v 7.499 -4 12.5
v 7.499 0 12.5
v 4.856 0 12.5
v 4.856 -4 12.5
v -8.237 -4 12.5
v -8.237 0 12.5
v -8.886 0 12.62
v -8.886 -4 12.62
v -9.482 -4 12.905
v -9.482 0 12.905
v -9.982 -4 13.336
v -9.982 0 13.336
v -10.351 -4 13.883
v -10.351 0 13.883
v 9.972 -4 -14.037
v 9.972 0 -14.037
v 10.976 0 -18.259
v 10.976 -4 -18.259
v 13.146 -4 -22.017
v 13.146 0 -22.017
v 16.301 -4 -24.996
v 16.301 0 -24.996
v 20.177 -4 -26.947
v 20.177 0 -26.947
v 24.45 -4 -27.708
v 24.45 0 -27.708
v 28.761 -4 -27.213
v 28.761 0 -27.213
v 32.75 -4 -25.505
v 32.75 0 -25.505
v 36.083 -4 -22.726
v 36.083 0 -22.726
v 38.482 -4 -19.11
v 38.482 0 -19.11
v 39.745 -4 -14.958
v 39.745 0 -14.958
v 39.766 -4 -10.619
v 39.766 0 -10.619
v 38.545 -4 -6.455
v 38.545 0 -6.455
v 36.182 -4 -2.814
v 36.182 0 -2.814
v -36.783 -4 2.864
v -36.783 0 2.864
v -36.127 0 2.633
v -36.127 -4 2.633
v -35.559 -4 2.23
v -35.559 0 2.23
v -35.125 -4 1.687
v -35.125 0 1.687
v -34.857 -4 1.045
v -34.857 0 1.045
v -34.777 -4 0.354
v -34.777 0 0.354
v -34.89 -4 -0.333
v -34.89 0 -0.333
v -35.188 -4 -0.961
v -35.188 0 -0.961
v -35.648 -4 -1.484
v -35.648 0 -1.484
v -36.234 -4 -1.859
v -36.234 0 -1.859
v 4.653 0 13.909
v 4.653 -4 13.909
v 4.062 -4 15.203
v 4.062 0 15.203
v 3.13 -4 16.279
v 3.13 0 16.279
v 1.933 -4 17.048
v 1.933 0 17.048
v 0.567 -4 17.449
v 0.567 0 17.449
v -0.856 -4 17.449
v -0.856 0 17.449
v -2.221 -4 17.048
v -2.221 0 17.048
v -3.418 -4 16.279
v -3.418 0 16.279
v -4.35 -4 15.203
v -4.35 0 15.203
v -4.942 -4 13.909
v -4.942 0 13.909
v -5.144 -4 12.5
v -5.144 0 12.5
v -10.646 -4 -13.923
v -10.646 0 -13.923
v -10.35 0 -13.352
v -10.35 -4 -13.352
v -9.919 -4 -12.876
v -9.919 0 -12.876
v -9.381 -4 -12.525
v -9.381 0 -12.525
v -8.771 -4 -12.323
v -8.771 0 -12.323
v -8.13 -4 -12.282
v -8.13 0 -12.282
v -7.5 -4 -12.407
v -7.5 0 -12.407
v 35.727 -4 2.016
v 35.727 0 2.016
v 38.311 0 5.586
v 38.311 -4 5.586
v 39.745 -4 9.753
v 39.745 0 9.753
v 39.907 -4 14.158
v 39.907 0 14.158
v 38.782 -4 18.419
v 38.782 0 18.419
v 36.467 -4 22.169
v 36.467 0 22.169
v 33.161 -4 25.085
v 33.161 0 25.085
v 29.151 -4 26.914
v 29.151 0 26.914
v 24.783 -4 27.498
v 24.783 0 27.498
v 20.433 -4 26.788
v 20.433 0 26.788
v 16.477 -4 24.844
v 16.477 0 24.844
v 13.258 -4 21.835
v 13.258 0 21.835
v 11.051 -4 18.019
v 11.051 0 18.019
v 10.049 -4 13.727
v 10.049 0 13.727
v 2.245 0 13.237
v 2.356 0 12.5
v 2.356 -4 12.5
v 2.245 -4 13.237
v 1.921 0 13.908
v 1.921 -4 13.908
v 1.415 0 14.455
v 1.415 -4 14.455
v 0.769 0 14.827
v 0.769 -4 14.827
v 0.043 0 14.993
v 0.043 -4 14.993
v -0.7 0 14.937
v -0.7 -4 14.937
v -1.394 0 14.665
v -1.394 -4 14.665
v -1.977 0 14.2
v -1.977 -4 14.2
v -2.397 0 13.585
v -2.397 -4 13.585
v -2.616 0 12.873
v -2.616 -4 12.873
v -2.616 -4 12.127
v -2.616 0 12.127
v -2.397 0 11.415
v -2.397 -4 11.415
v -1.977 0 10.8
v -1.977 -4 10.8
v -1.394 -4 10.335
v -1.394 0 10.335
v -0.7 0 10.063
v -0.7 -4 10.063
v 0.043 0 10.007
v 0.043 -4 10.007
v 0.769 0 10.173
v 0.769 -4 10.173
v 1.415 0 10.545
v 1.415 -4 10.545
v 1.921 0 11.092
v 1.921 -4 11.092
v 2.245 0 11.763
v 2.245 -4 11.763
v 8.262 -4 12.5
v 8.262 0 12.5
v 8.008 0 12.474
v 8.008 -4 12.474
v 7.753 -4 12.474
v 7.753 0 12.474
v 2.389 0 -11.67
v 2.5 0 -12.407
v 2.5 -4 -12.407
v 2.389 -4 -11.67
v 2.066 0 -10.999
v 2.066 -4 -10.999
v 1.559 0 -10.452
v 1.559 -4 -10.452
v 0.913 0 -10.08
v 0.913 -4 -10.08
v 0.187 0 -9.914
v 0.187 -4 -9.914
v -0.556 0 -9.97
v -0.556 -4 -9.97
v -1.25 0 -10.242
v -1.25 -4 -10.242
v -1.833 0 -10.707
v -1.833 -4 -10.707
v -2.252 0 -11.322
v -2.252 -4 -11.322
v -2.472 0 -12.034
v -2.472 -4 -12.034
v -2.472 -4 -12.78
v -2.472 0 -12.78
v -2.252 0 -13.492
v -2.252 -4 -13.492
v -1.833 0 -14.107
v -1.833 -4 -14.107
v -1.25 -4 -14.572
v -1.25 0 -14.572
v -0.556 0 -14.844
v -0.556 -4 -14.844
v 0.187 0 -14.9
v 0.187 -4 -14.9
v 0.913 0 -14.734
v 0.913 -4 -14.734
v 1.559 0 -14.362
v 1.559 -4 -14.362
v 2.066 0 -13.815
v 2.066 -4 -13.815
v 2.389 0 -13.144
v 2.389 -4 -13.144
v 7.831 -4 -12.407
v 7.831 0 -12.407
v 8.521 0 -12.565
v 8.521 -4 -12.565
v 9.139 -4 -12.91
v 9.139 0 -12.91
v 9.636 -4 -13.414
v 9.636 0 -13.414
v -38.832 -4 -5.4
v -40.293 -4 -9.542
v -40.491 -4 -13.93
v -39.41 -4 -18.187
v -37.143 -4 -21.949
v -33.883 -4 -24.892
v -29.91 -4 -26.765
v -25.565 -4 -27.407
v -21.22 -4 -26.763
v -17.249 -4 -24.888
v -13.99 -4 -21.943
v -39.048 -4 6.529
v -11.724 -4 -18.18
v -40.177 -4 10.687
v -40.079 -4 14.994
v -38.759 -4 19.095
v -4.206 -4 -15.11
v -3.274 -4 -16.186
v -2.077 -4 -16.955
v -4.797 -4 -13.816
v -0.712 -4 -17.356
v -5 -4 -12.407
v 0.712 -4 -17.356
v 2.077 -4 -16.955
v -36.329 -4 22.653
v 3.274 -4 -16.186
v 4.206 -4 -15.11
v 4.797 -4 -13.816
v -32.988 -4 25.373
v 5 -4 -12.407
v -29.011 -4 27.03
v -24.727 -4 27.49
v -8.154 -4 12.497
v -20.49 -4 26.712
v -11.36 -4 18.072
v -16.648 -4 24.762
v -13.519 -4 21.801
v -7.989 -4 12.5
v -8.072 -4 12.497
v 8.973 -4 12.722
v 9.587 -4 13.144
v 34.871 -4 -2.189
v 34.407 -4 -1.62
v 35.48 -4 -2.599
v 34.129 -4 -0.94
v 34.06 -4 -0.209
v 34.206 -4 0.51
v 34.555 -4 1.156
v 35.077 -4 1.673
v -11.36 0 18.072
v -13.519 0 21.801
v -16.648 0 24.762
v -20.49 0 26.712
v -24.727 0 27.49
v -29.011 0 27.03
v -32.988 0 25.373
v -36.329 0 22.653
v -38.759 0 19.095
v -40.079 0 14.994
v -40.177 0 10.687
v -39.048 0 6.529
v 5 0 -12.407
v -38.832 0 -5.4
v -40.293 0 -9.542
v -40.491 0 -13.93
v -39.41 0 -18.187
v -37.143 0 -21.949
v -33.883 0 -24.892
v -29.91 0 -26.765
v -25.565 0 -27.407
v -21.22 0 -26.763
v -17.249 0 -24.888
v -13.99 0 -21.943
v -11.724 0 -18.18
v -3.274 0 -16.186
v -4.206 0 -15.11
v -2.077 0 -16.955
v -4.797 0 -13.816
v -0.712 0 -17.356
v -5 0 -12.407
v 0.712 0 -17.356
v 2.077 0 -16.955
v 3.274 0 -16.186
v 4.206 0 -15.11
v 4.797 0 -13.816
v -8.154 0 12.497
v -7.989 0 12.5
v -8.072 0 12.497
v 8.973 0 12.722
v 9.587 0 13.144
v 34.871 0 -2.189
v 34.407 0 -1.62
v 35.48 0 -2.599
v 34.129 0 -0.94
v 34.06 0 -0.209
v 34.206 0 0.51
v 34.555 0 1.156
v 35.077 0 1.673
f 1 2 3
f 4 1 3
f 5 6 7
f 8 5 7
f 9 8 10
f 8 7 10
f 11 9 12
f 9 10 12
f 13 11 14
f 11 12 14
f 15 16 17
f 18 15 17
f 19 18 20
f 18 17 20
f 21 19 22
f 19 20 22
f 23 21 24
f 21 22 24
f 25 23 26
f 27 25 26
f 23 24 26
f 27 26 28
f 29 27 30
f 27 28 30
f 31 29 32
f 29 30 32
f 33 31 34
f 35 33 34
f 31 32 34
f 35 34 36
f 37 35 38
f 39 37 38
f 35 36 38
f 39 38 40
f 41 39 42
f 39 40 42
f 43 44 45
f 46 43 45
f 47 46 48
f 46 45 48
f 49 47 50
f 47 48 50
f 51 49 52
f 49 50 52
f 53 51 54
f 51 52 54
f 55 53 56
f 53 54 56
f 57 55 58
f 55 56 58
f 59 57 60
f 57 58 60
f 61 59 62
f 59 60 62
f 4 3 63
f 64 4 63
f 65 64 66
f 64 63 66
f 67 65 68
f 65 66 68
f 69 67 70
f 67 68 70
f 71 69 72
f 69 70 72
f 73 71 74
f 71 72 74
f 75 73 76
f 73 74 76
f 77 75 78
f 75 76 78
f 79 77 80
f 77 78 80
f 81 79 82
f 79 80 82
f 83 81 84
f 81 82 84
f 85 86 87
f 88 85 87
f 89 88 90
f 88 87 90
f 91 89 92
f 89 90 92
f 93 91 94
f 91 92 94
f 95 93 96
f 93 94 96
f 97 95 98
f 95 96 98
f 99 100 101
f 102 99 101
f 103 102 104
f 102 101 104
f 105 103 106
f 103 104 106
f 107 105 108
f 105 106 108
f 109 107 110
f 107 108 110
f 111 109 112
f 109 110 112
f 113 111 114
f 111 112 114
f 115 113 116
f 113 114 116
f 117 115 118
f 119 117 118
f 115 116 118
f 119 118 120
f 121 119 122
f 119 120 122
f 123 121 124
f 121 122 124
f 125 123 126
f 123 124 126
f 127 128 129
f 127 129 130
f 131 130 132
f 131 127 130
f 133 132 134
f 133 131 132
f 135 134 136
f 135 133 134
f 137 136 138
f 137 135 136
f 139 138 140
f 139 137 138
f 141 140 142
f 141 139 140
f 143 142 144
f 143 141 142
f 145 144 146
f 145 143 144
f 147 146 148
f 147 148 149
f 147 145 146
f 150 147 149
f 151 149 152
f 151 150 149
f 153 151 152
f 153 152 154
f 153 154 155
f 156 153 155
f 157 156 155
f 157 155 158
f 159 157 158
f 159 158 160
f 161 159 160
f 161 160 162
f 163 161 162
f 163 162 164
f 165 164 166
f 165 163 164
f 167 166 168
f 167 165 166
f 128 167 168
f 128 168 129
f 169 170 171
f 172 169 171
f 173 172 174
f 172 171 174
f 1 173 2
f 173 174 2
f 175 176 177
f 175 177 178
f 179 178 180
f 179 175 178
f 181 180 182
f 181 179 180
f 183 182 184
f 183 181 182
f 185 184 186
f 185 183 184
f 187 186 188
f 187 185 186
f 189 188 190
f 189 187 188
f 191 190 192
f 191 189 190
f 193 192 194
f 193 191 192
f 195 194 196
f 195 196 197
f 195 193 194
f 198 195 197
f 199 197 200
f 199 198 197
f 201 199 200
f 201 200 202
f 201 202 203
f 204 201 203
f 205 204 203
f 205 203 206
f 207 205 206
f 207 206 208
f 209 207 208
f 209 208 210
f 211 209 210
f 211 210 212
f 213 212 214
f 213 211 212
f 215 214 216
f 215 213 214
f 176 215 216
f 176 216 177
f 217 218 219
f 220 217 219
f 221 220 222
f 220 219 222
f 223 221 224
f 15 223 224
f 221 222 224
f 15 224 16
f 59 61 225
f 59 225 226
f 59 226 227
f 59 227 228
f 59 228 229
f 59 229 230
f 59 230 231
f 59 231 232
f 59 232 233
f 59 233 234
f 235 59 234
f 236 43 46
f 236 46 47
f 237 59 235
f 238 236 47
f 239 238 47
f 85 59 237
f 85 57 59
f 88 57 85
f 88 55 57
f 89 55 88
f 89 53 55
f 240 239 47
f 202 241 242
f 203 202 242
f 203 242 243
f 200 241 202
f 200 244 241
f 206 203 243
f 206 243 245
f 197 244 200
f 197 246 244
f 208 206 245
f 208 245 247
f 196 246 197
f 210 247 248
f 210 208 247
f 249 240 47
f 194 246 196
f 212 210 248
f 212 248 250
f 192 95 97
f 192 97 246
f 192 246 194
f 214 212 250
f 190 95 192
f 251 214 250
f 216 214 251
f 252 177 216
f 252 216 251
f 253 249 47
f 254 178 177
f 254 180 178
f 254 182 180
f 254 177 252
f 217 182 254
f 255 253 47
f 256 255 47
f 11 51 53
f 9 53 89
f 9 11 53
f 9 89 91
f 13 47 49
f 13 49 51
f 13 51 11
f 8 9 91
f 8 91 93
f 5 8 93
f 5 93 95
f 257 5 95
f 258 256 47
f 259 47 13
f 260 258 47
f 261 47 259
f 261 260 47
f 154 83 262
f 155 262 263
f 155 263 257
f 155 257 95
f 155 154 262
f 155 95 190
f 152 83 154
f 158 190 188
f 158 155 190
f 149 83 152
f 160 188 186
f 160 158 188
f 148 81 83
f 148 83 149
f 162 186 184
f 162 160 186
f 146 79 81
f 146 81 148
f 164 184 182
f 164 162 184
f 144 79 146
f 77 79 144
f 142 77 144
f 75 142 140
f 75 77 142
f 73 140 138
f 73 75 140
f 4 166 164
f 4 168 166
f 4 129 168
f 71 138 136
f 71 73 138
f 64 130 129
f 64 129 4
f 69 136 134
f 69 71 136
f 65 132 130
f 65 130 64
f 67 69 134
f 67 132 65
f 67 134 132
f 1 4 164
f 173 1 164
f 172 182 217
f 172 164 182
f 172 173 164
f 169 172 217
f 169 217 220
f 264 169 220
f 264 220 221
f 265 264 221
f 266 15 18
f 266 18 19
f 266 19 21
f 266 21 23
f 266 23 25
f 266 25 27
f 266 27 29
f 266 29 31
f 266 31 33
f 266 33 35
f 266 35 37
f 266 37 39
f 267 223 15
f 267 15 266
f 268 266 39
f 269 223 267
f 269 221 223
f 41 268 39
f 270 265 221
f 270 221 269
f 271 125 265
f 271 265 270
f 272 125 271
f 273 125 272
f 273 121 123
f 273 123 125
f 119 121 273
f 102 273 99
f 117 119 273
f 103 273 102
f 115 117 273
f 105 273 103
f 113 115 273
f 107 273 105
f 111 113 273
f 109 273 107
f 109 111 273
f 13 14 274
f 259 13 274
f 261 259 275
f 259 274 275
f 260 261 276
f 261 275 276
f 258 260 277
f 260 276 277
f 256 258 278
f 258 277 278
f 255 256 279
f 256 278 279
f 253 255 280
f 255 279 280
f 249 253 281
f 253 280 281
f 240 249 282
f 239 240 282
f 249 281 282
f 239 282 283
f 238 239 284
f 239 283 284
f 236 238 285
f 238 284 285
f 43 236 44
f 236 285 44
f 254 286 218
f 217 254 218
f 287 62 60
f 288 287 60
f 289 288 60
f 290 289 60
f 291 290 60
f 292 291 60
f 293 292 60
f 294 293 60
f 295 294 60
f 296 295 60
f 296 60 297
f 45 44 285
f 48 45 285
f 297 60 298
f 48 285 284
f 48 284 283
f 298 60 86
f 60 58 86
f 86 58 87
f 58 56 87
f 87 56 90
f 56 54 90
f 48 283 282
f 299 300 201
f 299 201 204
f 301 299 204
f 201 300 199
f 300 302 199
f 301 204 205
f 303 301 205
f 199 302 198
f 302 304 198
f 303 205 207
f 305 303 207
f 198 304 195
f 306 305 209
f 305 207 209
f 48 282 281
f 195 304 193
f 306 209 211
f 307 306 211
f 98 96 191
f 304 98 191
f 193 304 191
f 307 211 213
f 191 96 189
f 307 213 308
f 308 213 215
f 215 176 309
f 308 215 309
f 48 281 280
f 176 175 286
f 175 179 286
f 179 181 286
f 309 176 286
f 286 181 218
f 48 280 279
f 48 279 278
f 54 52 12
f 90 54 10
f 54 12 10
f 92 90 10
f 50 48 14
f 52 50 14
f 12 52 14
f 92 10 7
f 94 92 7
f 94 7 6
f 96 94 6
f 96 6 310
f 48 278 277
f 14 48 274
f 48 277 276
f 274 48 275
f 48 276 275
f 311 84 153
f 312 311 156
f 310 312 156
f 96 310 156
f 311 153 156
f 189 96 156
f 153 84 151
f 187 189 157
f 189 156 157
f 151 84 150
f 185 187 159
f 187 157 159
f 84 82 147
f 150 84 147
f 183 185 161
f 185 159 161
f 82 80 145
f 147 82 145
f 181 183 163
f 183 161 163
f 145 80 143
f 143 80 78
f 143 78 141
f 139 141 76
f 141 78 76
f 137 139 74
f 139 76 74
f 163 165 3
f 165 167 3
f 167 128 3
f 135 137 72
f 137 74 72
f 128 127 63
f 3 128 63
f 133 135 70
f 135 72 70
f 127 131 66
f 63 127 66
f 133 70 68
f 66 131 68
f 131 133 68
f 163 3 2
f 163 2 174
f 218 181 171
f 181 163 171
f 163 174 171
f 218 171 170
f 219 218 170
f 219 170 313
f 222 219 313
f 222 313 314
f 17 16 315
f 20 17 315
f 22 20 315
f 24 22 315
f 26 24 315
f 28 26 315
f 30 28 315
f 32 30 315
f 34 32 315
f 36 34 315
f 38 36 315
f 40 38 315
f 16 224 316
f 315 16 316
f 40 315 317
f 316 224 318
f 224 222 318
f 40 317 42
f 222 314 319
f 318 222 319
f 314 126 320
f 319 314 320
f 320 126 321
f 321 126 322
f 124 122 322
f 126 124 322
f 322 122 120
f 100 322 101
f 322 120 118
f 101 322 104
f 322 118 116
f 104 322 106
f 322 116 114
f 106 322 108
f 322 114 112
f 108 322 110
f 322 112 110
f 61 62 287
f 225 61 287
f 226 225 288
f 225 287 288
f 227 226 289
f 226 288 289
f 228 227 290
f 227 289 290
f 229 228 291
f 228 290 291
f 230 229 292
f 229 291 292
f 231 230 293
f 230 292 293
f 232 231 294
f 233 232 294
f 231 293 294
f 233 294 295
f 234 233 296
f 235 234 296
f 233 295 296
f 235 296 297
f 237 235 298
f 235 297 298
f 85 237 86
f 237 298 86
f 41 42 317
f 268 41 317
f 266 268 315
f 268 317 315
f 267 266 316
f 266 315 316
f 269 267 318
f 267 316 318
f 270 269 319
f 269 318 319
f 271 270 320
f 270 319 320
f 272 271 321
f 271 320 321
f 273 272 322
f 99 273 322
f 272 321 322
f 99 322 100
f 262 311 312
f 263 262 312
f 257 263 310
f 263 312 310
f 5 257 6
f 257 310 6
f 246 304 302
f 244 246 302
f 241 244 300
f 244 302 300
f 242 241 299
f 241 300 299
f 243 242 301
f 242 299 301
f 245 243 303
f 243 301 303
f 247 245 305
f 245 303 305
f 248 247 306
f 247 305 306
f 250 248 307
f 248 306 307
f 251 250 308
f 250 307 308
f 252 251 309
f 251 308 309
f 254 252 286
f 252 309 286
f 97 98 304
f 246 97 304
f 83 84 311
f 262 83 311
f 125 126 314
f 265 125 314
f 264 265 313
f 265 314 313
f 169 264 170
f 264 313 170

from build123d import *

# Parameters (mm, degrees)
F0_R     = 2.5
F1_DEPTH = 4


with BuildPart() as f1:
    # F0 (on Front) → F1 (new body)
    with BuildSketch(Plane.XZ):
        with BuildLine():
            ThreePointArc((-7.989135, 12.5), (-8.11298, 12.496931), (-8.236825, 12.5))
            ThreePointArc((-8.236825, 12.5), (-9.481632, 12.904852), (-10.35122, 13.883252))
            ThreePointArc((-10.35122, 13.883252), (-31.0592, 26.345043), (-36.782912, 2.864077))
            ThreePointArc((-36.782912, 2.864077), (-34.792965, 0.702031), (-36.233629, -1.858988))
            ThreePointArc((-36.233629, -1.858988), (-31.965386, -25.974795), (-10.645566, -13.922603))
            ThreePointArc((-10.645566, -13.922603), (-9.3812, -12.524699), (-7.5, -12.407048))
            Line((-7.5, -12.407048), (-5, -12.407048))
            ThreePointArc((-5, -12.407048), (0, -17.407048), (5, -12.407048))
            Line((5, -12.407048), (7.831228, -12.407048))
            ThreePointArc((7.831228, -12.407048), (9.139477, -12.909558), (9.971767, -14.03709))
            ThreePointArc((9.971767, -14.03709), (30.817587, -26.503972), (36.182002, -2.81443))
            ThreePointArc((36.182002, -2.81443), (34.067365, -0.577316), (35.726535, 2.01566))
            ThreePointArc((35.726535, 2.01566), (31.223825, 26.147431), (10.049361, 13.727334))
            ThreePointArc((10.049361, 13.727334), (9.295627, 12.909806), (8.261931, 12.5))
            ThreePointArc((8.261931, 12.5), (7.880498, 12.47073), (7.499065, 12.5))
            Line((7.499065, 12.5), (4.85588, 12.5))
            ThreePointArc((4.85588, 12.5), (-0.14412, 17.5), (-5.14412, 12.5))
            Line((-5.14412, 12.5), (-7.989135, 12.5))
        make_face()
        with Locations((0, -12.407048)):
            Circle(F0_R, mode=Mode.SUBTRACT)
        with Locations((-0.14412, 12.5)):
            Circle(F0_R, mode=Mode.SUBTRACT)
    extrude(amount=F1_DEPTH)


solid = f1.part
